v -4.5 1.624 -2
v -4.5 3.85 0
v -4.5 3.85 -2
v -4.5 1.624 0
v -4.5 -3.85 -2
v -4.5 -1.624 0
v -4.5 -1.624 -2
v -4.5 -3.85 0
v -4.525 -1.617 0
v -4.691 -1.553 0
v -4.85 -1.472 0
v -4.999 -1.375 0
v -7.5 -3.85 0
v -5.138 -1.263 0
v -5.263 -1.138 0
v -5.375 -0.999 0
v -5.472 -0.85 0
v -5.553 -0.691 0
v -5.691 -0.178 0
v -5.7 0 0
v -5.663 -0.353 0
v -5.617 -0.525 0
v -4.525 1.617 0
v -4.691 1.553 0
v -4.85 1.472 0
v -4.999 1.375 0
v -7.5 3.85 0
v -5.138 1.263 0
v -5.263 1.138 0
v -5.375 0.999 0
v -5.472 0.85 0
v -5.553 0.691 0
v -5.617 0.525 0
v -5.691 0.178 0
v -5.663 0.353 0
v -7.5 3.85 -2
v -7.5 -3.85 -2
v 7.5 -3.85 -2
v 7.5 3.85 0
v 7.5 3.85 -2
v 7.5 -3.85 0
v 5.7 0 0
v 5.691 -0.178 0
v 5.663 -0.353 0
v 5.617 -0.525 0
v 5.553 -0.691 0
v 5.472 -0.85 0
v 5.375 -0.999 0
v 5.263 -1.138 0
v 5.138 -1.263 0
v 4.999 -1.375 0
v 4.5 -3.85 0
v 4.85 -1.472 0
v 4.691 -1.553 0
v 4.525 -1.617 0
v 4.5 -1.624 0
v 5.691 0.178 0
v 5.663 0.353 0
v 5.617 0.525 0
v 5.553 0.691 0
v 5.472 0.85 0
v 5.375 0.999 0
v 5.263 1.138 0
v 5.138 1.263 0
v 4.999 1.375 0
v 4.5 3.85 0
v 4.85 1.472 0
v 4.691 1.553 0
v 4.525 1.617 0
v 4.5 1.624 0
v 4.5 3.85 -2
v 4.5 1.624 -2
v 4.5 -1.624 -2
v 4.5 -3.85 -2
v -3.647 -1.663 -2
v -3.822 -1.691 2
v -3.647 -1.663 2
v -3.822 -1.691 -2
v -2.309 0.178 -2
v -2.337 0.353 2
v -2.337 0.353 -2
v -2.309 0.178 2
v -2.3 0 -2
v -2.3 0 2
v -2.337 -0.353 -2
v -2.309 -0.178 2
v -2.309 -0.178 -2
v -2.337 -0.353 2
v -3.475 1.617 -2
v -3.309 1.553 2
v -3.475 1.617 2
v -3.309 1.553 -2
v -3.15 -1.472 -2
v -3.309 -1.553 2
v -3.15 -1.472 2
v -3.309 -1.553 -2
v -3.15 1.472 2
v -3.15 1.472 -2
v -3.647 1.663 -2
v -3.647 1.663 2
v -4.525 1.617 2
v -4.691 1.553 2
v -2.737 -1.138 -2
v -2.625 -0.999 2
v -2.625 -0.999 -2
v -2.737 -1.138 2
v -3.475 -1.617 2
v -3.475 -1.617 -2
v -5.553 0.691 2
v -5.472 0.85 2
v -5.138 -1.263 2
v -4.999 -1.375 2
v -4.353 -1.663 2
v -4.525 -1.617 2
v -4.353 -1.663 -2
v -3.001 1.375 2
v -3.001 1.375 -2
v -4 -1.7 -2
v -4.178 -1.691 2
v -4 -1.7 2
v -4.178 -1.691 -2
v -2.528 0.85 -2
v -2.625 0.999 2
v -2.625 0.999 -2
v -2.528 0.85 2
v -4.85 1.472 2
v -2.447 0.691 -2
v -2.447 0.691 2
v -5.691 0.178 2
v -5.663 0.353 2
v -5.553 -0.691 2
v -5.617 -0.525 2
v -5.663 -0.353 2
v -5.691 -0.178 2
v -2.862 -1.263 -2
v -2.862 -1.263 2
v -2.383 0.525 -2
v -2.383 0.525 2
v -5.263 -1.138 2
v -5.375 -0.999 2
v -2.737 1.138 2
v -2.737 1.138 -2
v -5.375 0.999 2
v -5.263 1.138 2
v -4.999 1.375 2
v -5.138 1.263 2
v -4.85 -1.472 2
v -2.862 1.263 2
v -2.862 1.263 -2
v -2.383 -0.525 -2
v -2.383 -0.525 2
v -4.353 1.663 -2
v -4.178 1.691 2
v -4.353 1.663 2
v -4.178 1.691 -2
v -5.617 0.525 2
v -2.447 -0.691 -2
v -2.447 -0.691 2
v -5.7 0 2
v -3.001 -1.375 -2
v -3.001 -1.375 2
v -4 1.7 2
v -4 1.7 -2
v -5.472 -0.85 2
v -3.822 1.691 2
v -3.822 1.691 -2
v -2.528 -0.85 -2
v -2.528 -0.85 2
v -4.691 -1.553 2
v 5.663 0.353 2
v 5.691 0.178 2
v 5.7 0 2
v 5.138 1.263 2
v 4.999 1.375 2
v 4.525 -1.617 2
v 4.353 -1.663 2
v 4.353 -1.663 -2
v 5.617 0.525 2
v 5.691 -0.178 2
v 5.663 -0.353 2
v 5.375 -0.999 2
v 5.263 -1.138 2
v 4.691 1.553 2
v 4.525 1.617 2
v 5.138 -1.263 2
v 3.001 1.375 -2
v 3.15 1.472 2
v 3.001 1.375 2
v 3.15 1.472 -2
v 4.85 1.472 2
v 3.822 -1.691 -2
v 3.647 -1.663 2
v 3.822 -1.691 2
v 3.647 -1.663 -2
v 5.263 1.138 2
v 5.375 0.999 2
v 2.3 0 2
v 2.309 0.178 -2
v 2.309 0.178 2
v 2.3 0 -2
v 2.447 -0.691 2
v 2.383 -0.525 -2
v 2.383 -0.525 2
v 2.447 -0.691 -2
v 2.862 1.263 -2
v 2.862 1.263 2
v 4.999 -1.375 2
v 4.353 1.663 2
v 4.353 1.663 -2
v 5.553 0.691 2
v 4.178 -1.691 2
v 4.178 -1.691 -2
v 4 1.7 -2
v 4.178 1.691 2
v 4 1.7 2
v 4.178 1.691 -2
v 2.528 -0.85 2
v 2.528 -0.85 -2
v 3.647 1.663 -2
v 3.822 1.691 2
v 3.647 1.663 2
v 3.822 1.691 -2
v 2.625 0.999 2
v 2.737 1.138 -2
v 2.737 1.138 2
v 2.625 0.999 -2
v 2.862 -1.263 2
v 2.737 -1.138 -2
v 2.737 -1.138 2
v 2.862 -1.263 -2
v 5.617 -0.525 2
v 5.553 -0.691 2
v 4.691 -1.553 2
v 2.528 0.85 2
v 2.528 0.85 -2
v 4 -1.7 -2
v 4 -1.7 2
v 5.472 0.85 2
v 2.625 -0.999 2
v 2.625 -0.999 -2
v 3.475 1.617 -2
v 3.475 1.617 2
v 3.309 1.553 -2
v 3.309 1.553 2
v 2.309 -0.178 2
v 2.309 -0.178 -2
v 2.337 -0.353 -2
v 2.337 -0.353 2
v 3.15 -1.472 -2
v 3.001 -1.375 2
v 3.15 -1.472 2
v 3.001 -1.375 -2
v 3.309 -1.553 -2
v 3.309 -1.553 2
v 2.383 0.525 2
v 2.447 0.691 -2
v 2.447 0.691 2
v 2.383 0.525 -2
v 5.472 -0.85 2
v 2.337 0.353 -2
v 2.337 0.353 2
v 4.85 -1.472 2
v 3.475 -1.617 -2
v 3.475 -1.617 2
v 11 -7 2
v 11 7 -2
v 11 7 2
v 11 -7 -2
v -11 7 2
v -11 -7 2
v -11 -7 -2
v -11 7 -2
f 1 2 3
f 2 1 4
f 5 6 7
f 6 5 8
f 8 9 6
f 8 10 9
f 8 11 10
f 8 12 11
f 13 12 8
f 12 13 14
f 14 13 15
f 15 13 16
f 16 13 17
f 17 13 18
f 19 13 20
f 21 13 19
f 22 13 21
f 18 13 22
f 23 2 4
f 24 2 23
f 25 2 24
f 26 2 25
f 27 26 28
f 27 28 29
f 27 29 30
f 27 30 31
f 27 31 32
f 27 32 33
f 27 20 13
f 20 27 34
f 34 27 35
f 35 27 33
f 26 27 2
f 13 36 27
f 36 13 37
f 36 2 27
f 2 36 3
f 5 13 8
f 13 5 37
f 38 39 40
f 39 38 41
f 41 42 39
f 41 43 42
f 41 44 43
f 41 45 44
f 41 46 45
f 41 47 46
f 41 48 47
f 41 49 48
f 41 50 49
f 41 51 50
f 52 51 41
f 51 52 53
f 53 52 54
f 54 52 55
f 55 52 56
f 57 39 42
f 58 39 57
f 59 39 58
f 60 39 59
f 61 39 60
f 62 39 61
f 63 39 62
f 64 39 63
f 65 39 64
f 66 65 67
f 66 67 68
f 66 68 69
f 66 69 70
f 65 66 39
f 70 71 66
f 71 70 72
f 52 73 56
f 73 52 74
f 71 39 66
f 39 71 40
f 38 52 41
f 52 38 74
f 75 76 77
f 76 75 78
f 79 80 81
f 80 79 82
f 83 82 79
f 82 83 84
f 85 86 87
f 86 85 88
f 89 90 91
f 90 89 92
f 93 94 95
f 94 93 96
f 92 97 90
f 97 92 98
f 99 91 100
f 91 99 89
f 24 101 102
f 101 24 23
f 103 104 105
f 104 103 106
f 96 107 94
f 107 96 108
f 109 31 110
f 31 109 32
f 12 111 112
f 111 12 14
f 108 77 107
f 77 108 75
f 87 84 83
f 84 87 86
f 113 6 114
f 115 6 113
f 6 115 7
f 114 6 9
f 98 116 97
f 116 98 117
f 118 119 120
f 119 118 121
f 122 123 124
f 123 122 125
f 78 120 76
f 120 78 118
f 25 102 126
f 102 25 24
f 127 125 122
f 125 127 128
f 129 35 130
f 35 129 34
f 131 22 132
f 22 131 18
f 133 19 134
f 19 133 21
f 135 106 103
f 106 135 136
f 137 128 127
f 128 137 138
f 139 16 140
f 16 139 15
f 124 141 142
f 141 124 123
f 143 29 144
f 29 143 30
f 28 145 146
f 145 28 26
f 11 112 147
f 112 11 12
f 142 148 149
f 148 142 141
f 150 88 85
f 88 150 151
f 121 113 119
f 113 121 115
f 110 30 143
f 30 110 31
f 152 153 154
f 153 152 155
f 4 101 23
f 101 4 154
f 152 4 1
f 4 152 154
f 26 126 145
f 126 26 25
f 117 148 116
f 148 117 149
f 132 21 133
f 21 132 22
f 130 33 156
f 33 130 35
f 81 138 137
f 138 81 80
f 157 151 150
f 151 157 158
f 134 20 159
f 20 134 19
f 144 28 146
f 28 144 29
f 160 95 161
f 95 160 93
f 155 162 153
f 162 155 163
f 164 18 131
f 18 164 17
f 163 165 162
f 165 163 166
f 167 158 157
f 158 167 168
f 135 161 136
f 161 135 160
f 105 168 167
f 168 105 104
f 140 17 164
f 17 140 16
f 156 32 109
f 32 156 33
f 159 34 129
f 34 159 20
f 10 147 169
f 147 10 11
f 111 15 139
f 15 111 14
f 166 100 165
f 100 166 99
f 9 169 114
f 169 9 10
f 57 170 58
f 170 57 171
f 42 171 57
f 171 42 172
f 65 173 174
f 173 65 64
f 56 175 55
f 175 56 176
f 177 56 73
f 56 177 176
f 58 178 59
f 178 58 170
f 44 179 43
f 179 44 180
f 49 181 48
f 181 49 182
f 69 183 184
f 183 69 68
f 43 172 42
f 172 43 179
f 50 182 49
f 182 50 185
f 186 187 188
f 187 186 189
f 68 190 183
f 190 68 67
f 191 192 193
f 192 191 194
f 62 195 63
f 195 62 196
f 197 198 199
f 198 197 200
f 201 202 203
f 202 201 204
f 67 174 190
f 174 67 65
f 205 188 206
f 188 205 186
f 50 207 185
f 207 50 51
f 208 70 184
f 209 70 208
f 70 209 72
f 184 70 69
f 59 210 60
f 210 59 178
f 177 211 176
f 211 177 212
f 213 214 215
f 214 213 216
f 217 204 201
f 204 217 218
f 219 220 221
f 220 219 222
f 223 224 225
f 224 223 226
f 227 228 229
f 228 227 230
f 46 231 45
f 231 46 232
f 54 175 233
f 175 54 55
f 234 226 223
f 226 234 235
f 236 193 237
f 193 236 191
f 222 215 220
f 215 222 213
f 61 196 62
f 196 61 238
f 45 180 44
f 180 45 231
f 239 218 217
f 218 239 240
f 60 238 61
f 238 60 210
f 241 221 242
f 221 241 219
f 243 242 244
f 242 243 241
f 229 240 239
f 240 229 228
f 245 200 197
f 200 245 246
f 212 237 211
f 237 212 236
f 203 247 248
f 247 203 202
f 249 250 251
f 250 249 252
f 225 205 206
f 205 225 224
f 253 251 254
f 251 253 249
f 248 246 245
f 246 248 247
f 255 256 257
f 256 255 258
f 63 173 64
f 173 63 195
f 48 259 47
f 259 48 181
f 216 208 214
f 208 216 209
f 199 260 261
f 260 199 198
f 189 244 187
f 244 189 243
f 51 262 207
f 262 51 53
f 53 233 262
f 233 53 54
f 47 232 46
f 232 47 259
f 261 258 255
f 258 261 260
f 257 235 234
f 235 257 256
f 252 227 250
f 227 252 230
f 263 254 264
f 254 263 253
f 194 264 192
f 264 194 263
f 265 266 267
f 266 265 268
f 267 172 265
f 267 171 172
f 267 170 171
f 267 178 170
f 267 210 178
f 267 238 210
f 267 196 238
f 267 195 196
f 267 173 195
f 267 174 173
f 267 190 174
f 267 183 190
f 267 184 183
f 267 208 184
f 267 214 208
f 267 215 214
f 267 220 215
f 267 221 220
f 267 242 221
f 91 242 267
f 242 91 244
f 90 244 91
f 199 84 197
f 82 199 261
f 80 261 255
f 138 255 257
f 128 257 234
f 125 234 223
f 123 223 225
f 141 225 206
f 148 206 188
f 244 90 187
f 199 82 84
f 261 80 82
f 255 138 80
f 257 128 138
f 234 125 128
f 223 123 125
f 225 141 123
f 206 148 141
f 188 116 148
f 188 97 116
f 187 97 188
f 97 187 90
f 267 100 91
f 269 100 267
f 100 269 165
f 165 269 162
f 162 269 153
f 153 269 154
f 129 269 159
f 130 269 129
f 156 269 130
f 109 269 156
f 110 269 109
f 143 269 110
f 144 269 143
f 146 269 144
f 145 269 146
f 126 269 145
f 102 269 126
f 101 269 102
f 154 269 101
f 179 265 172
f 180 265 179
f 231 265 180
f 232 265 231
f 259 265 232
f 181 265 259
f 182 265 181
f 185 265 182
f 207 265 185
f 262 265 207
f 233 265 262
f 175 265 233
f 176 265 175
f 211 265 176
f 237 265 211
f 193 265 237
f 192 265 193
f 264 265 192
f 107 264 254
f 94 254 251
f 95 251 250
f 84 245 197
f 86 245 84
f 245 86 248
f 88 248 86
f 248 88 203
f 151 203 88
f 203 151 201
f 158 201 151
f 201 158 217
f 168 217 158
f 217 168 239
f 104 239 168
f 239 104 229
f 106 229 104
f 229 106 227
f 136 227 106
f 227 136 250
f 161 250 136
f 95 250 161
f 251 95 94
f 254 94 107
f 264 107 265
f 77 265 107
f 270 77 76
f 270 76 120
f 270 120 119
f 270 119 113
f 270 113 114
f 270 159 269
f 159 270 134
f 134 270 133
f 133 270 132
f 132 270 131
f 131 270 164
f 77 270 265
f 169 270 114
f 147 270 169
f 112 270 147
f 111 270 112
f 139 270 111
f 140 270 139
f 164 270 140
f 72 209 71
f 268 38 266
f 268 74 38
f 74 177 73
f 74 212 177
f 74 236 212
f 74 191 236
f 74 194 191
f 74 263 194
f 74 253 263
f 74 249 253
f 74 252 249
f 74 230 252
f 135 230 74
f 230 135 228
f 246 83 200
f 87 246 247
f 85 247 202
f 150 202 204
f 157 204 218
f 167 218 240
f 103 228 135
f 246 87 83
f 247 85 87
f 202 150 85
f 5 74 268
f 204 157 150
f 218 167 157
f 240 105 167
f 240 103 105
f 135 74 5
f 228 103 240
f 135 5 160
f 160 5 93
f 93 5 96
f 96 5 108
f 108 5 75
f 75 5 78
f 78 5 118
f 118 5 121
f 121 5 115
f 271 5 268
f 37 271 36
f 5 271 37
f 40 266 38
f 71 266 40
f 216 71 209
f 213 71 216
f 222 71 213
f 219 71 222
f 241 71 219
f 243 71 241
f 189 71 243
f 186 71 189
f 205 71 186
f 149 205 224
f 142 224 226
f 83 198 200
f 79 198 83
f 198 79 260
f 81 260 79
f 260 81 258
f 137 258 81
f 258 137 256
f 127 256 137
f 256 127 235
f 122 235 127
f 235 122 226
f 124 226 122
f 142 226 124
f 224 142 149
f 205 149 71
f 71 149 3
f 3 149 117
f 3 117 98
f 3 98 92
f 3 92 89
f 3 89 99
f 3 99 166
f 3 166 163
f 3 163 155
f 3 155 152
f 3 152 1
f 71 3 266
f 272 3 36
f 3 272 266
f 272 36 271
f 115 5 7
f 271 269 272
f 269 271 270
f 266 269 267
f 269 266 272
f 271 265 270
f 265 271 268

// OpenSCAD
// Cable-tie base with two strap slots.
$fn = 60;
eps = 0.02;
base_w = 14;
base_l = 22;
base_t = 4;
slot_w = 3;
slot_l = 12;
difference() {
    cube([base_l,base_w,base_t],center=true);
    for (x=[-slot_l/2,slot_l/2]) translate([x,0,-base_t/2-eps]) cube([slot_w,base_w*0.55,base_t+2*eps],center=true);
    for (x=[-base_l/2+7,base_l/2-7]) translate([x,0,-base_t/2-eps]) cylinder(d=3.4,h=base_t+2*eps);
}
